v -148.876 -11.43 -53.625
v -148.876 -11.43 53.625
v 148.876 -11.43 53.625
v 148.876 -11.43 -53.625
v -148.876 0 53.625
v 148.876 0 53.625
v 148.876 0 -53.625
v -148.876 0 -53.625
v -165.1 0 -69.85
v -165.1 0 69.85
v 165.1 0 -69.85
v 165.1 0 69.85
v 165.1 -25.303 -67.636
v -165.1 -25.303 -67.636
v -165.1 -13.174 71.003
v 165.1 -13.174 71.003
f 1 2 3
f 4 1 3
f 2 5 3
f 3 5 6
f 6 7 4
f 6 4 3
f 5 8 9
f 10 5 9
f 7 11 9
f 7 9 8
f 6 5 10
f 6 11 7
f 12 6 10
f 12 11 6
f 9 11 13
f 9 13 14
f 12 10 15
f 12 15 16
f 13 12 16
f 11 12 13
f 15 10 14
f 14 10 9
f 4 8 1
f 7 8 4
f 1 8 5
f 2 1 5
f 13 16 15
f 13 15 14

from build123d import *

# Parameters (mm, degrees)
F2_DEPTH      = 165.1
F2_DEPTH_BACK = 165.1
F3_DEPTH      = 13.2243322
F0_W          = 297.7512968
F0_H          = 107.2502808
F0_W_2        = 287.2877414
F0_H_2        = 96.8048356
F4_DEPTH      = 11.43


with BuildPart() as f2:
    # F1 (on Right) → F2 (new body, two sides)
    with BuildSketch(Plane.YZ) as f2_sk:
        Polygon((0, -69.85), (0, 0), (0, 69.85), (-12.12932521, -68.7888215479), align=None)
    extrude(amount=F2_DEPTH)
    extrude(f2_sk.sketch, amount=-F2_DEPTH_BACK)

    # F3 (add): a face of the model
    f3_faces = [f2.faces().sort_by_distance(p)[0] for p in [
        (0, -6.064662605, 0.530589226),
    ]]
    extrude(f3_faces, amount=F3_DEPTH)

    # F0 (on Front) → F4 (cut)
    with BuildSketch(Plane.XZ):
        Rectangle(F0_W, F0_H)
        Rectangle(F0_W_2, F0_H_2, mode=Mode.SUBTRACT)
        Rectangle(F0_W_2, F0_H_2)
    extrude(amount=F4_DEPTH, mode=Mode.SUBTRACT)


solid = f2.part
